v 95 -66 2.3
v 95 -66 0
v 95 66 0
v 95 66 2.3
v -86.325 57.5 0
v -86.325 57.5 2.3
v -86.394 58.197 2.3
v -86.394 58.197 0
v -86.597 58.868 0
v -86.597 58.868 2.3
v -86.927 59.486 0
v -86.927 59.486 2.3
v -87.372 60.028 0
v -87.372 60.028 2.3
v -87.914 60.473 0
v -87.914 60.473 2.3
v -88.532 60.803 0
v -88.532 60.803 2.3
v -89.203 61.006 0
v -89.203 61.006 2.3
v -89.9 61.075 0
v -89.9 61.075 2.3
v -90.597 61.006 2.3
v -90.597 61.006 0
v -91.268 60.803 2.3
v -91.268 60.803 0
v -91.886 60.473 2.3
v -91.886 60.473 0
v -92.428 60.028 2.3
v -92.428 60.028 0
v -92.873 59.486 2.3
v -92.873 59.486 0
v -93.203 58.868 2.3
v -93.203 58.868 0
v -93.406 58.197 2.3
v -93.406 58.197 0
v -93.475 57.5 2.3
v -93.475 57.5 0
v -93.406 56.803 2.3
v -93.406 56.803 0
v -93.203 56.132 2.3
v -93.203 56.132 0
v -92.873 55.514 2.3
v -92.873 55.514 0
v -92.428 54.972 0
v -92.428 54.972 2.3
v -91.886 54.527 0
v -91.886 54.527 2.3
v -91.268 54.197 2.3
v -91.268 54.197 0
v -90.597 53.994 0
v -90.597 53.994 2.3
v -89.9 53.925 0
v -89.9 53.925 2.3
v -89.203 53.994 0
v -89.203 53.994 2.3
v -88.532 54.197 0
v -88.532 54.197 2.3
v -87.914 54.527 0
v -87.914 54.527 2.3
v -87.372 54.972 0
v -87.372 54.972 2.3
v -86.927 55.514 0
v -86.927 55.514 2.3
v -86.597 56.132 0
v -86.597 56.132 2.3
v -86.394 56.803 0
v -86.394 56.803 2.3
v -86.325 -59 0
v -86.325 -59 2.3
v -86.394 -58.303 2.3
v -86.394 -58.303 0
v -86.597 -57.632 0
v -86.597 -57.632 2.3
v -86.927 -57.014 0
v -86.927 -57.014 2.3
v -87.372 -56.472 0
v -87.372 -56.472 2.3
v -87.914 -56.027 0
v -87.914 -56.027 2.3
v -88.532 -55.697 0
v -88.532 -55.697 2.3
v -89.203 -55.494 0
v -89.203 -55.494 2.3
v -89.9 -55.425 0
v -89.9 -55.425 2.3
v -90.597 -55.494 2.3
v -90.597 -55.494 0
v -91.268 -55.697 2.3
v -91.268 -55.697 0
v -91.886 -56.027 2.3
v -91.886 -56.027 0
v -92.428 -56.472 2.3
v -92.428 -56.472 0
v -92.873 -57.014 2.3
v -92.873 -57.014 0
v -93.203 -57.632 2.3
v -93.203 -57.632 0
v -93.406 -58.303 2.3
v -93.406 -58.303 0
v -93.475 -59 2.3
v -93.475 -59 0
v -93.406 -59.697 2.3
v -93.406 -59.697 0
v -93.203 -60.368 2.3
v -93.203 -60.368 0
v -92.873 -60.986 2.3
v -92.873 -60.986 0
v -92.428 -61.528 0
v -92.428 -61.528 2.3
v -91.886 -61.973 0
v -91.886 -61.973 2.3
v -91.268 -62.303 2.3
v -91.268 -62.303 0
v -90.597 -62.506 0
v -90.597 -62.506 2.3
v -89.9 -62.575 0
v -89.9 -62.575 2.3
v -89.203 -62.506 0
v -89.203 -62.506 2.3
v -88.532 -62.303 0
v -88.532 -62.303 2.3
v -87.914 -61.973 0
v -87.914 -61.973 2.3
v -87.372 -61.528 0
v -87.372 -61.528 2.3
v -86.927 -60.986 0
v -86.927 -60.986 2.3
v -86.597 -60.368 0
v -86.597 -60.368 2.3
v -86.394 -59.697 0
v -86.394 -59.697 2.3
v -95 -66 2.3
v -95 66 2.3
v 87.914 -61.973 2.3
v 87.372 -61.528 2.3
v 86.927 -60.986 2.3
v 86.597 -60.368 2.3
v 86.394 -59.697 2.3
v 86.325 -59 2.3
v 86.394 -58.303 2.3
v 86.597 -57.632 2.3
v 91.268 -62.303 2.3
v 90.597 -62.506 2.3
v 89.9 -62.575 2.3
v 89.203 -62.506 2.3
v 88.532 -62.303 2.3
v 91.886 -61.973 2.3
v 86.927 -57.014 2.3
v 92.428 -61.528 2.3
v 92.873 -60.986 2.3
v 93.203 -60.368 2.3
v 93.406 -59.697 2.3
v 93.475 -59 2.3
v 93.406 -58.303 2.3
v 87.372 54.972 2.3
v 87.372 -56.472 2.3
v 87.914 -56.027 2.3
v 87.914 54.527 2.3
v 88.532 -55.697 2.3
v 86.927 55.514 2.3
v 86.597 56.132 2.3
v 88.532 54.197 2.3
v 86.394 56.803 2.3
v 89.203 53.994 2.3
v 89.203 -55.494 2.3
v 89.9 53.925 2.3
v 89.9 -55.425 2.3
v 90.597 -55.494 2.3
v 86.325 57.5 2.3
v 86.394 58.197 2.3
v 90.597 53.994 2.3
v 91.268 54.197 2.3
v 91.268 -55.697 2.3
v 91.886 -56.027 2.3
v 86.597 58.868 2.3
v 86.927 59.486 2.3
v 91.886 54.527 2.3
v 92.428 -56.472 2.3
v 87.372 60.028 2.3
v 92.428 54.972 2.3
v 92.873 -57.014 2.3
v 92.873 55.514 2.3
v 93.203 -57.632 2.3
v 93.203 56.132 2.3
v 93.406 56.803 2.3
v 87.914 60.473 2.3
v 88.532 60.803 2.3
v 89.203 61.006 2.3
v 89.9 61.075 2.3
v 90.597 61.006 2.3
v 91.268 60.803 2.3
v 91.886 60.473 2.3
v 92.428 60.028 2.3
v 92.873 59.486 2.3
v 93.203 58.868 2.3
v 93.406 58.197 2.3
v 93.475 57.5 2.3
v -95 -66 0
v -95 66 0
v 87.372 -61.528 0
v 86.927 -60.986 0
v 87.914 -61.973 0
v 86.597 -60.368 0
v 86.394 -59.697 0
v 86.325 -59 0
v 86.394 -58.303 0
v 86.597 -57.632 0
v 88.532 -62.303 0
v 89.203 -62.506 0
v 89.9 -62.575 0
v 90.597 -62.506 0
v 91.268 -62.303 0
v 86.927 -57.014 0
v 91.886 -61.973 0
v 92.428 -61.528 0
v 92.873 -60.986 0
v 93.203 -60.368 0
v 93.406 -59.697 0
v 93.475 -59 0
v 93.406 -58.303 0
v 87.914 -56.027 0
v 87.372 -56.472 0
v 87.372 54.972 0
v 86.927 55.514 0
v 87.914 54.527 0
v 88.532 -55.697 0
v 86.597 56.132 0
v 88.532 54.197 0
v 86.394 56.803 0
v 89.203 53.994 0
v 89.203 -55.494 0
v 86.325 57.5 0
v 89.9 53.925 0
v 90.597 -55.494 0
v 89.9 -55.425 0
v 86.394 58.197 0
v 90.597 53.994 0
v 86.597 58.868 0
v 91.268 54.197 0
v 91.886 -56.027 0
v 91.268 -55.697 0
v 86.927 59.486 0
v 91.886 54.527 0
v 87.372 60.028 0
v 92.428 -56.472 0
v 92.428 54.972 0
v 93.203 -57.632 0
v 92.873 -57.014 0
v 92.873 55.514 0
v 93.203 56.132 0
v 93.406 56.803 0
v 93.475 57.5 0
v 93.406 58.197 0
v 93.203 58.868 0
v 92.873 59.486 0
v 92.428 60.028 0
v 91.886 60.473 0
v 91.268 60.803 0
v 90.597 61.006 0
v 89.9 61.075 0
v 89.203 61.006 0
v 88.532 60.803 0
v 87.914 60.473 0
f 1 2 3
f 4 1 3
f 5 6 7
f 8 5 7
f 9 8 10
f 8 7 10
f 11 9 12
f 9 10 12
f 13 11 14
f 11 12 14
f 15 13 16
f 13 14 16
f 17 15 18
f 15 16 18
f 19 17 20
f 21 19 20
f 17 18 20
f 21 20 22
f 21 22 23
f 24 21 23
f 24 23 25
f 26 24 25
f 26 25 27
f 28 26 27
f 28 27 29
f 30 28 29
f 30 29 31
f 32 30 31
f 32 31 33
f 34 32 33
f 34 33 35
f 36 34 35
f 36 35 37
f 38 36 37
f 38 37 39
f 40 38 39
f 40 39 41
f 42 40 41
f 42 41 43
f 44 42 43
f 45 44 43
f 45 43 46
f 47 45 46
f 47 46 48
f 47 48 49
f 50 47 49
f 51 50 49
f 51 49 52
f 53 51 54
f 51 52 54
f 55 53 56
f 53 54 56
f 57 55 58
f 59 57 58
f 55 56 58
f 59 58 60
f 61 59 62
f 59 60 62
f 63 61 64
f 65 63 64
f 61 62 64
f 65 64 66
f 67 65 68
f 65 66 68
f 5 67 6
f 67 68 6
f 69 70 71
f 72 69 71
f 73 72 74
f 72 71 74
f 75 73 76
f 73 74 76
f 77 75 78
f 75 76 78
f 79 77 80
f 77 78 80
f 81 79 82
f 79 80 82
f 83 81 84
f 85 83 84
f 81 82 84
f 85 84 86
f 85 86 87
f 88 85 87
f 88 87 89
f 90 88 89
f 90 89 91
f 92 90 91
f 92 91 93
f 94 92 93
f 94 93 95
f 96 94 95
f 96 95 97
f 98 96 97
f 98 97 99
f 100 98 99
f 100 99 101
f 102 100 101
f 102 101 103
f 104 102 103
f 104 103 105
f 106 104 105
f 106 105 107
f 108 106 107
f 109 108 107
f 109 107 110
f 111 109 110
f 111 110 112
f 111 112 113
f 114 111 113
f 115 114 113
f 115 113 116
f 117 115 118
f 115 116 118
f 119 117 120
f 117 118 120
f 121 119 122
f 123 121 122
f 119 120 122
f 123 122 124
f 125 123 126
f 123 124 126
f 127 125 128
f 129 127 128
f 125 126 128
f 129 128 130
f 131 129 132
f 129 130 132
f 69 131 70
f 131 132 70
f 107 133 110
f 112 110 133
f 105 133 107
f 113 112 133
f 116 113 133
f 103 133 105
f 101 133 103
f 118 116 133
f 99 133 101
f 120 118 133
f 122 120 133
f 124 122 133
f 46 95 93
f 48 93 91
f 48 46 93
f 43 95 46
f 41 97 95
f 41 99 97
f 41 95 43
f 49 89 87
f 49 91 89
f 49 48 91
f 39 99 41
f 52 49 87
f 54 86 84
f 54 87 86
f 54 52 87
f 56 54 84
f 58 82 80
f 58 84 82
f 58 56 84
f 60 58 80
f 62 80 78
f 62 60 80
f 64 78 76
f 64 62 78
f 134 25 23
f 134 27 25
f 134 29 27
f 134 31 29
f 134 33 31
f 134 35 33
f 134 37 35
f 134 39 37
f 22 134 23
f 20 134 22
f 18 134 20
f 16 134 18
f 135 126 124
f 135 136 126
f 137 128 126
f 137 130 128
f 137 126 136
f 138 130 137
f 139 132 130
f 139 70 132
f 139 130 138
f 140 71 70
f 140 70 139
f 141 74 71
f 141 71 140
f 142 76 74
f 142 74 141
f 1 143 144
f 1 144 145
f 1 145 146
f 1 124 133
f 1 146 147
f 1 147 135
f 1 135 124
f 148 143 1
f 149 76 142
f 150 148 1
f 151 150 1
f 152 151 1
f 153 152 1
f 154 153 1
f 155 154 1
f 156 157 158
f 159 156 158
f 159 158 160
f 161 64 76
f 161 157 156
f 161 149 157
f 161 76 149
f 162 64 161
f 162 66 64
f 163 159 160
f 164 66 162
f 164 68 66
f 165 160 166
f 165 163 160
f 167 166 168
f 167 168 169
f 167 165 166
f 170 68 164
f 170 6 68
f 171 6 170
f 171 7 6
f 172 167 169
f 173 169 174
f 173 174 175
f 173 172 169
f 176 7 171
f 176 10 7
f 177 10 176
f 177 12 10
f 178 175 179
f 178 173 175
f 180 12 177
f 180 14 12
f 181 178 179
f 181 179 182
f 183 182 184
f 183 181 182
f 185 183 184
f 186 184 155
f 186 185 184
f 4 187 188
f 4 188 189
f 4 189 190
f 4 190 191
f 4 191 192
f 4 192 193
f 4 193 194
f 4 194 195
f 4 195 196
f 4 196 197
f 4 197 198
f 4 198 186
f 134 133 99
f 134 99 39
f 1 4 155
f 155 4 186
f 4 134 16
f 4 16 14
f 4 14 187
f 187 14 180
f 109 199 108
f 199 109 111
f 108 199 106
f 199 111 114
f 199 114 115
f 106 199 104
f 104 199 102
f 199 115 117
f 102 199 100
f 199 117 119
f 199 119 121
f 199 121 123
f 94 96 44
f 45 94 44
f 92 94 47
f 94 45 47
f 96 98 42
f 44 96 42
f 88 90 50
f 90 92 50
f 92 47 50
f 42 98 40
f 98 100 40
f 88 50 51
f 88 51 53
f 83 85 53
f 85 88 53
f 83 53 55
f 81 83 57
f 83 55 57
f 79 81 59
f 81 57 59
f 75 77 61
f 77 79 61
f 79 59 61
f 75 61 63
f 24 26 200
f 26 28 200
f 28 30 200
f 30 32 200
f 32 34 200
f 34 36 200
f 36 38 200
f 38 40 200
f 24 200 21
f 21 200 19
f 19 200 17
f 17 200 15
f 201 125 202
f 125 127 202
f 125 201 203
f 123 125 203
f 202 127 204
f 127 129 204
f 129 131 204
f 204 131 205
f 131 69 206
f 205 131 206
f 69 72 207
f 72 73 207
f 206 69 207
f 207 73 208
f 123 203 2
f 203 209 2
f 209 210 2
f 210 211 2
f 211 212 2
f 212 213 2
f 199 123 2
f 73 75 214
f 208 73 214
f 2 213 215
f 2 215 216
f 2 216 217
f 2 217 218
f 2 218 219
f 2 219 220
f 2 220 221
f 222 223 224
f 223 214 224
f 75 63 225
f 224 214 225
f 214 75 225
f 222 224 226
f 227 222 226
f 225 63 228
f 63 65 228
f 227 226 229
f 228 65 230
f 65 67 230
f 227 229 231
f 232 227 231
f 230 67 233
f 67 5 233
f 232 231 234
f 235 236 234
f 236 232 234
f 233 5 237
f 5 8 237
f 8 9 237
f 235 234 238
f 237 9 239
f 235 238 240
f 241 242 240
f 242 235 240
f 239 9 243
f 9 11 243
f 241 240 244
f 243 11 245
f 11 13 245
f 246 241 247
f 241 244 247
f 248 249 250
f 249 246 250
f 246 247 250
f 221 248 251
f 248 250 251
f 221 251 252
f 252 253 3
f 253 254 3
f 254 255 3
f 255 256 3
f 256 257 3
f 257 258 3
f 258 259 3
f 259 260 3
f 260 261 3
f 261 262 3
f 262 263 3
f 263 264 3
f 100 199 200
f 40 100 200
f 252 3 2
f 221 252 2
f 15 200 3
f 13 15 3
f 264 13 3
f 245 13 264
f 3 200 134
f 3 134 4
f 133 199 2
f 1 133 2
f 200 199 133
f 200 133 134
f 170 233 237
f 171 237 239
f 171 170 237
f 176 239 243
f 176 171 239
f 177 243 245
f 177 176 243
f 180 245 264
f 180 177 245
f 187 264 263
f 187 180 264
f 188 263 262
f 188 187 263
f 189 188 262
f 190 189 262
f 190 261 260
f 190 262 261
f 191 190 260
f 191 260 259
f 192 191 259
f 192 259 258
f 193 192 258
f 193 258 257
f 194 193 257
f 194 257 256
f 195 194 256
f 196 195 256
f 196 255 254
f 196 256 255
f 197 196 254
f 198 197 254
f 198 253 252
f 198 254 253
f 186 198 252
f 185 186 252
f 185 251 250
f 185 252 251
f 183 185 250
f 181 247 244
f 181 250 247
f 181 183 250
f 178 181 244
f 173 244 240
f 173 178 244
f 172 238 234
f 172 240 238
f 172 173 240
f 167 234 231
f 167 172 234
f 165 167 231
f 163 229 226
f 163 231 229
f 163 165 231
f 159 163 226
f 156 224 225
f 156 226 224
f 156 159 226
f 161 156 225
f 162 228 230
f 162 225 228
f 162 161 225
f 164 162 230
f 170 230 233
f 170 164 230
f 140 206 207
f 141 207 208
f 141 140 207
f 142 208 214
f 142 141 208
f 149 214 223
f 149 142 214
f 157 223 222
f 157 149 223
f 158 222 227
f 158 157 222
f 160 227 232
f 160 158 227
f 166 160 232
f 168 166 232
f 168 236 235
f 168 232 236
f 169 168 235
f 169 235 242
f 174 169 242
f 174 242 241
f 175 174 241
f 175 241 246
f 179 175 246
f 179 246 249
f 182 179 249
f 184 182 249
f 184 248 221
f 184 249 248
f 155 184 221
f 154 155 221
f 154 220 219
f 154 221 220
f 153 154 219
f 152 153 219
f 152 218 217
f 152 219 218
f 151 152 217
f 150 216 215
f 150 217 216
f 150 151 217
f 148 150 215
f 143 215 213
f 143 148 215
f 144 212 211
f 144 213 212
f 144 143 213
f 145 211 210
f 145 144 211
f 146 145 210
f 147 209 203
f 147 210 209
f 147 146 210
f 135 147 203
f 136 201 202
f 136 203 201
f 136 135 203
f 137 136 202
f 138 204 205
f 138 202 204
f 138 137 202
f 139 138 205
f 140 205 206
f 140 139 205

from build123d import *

# Parameters (mm, degrees)
SKETCH_W                = 190
SKETCH_H                = 132
PAD_DEPTH               = 2.3
SKETCH001_R             = 3.575
POCKET_DEPTH            = 465.028955
SKETCH001_MIRRORED_2_R  = 3.575
POCKET_MIRRORED_2_DEPTH = 465.028955
LINEARPATTERN_COUNT     = 2
LINEARPATTERN_PITCH     = 116.5


with BuildPart() as part:
    # Sketch → Pad (new body)
    with BuildSketch(Plane.XY):
        Rectangle(SKETCH_W, SKETCH_H)
    extrude(amount=PAD_DEPTH)

    # Sketch001 (on Face6 of Pad) → Pocket (cut, through all)
    with BuildSketch(Plane.XY.offset(2.3)):
        with Locations((-89.9, 57.5)):
            Circle(SKETCH001_R)
    pocket = extrude(amount=-POCKET_DEPTH, mode=Mode.SUBTRACT)

    # Sketch001 Mirrored 2 → Pocket Mirrored 2 (cut, through all)
    with BuildSketch(Plane(origin=(0, 0, 2.3), x_dir=(-1, 0, 0), z_dir=(0, 0, -1))):
        with Locations((-89.9, 57.5)):
            Circle(SKETCH001_MIRRORED_2_R)
    pocket_mirrored_2 = extrude(amount=POCKET_MIRRORED_2_DEPTH, mode=Mode.SUBTRACT)

    # LinearPattern: Pocket, Pocket Mirrored 2 ×2
    with Locations(*[(0, -i * LINEARPATTERN_PITCH, 0) for i in range(1, LINEARPATTERN_COUNT)]):
        add(pocket, mode=Mode.SUBTRACT)
        add(pocket_mirrored_2, mode=Mode.SUBTRACT)


solid = part.part
